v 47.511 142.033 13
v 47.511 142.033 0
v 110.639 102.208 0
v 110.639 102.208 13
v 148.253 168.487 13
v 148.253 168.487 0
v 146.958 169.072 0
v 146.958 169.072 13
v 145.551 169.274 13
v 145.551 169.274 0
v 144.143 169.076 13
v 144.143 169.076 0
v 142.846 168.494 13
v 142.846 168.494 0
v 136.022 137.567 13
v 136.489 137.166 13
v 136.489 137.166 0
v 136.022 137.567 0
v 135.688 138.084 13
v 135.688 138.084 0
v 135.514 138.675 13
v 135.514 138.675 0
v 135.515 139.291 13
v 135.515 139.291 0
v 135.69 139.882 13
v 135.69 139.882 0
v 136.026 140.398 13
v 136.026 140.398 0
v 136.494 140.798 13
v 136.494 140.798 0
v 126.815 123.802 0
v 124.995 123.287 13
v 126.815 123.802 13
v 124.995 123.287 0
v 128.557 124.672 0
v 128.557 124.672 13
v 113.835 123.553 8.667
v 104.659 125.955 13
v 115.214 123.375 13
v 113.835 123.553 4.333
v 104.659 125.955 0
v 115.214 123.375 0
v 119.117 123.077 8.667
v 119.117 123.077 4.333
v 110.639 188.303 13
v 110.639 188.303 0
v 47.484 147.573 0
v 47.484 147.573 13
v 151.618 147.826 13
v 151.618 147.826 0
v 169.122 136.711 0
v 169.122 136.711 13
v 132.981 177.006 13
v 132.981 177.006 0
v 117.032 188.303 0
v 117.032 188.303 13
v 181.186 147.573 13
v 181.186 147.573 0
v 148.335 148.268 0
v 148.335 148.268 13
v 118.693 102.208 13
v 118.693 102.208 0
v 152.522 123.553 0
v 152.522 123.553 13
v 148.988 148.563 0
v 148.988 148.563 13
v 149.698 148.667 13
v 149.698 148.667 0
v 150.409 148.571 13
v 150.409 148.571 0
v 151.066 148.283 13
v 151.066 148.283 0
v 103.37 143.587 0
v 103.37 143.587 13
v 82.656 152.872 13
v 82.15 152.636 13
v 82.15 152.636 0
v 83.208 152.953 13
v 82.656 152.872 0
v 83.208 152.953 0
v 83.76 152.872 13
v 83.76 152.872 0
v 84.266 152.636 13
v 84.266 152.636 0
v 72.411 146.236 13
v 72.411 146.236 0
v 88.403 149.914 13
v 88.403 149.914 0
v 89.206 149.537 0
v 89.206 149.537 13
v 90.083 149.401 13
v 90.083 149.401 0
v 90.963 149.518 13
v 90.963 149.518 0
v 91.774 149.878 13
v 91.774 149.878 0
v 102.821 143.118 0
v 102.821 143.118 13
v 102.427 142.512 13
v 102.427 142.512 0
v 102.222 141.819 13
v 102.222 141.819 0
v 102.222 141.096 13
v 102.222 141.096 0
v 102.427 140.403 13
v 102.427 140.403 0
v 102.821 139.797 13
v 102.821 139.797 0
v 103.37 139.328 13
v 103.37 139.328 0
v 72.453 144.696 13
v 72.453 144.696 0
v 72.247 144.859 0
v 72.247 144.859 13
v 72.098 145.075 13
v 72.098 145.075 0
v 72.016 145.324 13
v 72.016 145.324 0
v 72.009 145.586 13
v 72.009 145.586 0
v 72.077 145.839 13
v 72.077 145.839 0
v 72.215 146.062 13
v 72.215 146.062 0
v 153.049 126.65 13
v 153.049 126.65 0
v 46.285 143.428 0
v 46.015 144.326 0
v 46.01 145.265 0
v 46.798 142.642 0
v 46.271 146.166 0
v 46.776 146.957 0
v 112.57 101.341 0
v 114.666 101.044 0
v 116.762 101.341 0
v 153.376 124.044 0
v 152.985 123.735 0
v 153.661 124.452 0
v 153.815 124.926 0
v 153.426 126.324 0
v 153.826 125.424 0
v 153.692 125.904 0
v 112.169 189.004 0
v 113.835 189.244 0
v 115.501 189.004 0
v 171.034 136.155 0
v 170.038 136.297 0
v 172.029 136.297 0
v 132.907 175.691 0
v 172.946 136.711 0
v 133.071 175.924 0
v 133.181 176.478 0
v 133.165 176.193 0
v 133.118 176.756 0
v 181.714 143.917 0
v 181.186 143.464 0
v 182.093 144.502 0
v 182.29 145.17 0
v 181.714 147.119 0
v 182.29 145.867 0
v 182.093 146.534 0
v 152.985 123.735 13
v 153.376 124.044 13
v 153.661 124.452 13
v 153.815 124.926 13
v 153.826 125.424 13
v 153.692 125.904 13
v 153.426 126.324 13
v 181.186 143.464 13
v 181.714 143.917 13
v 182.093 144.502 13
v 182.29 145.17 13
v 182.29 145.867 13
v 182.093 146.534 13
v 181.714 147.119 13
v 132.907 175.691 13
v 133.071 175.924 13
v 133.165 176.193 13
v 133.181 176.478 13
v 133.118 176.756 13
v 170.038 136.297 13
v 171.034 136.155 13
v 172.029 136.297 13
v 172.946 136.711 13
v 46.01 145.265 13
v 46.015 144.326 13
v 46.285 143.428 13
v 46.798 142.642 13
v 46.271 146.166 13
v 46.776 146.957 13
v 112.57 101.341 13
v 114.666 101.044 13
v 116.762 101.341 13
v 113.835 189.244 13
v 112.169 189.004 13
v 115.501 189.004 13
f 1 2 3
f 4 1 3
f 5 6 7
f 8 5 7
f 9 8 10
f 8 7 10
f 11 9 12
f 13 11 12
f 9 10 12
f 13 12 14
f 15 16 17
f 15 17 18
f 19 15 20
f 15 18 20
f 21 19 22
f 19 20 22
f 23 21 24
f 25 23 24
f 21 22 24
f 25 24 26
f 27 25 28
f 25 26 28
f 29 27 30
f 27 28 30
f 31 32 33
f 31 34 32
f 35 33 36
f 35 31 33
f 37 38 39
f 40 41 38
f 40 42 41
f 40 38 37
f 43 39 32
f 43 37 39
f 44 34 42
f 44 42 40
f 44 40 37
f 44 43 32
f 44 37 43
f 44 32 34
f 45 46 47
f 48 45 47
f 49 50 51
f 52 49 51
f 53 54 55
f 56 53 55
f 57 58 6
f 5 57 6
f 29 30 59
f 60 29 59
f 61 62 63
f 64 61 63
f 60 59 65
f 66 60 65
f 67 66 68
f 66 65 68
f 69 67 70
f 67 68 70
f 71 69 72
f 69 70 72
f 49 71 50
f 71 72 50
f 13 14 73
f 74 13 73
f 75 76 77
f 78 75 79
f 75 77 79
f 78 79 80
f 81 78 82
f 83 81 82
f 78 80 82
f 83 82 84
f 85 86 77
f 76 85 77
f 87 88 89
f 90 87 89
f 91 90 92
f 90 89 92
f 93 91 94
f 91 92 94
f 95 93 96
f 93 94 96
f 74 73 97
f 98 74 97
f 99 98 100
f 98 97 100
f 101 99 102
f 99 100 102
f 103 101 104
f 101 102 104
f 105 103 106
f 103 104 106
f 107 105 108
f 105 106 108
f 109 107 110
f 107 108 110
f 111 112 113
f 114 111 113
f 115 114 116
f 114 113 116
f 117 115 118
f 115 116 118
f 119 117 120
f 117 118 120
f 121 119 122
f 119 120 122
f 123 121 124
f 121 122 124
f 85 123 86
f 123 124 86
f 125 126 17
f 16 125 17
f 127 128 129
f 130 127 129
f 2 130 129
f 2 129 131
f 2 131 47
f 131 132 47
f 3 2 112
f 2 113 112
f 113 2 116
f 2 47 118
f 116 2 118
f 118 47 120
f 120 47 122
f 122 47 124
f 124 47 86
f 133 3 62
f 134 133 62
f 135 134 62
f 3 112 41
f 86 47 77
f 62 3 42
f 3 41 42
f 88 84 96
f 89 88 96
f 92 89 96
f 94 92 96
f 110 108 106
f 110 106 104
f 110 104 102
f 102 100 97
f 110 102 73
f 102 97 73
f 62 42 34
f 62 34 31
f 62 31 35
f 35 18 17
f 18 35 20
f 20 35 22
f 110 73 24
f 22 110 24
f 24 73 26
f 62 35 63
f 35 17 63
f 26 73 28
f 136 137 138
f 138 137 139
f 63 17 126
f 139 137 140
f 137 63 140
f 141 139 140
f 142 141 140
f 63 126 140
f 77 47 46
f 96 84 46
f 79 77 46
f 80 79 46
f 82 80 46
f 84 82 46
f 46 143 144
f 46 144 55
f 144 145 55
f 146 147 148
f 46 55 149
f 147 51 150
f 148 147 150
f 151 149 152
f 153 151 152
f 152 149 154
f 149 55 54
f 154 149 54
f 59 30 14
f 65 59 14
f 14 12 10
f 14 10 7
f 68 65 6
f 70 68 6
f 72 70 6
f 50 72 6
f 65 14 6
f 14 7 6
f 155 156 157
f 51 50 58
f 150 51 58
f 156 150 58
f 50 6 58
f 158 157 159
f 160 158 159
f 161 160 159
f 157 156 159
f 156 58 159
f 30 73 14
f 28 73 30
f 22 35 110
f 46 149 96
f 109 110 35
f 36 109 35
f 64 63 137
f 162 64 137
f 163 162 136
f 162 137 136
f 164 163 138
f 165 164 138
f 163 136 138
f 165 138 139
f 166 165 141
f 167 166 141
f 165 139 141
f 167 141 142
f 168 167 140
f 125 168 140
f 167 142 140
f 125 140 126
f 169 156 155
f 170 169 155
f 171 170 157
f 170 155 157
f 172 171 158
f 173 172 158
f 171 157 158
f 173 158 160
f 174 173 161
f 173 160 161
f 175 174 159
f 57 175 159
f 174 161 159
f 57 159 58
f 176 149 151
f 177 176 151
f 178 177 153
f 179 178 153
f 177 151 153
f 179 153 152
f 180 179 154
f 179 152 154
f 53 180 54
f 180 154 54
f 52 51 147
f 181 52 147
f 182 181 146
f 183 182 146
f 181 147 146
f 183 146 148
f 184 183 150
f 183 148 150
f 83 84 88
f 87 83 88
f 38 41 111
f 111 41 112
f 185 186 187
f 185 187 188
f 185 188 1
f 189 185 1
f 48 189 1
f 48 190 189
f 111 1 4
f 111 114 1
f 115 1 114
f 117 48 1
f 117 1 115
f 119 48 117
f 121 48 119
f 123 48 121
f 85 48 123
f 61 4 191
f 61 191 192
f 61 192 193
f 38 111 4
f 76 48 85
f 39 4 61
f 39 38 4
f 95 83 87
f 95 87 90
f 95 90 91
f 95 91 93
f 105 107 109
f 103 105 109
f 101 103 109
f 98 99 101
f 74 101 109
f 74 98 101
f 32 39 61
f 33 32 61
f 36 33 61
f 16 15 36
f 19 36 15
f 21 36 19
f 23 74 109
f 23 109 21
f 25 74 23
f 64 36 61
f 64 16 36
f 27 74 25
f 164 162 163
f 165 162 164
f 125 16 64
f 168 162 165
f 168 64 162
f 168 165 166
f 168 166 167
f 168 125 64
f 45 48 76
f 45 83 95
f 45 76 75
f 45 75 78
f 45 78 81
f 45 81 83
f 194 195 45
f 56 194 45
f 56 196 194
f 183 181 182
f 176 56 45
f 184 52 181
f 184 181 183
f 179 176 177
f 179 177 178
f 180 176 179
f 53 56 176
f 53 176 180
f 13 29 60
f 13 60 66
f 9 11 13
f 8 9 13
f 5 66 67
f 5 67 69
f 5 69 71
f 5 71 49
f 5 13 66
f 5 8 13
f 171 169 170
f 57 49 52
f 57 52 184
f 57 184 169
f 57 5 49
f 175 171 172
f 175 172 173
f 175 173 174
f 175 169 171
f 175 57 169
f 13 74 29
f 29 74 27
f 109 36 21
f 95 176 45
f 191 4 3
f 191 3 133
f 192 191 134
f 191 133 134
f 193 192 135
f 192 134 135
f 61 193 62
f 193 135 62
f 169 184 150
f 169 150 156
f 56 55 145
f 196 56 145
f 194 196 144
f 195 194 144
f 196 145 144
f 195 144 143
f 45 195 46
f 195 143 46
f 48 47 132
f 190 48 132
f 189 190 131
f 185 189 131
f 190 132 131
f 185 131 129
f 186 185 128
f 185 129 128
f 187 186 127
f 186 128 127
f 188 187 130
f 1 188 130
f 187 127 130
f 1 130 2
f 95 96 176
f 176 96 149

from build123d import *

# Parameters (mm, degrees)
EXTRUDE_1_DEPTH = 13


with BuildPart() as part:
    # 草图1 → 凸台-拉伸1 (new body)
    with BuildSketch(Plane.XY):
        with BuildLine():
            Line((47.511484966, 142.033134461), (110.638937631, 102.207761638))
            ThreePointArc((110.638937631, 102.207761638), (114.665827011, 101.043744068), (118.692649861, 102.207991771))
            Line((118.692649861, 102.207991771), (152.521772353, 123.552557153))
            ThreePointArc((152.521772353, 123.552557153), (153.81505185, 124.925900716), (153.04891629, 126.649757061))
            Line((153.04891629, 126.649757061), (136.489129492, 137.165850219))
            ThreePointArc((136.489129492, 137.165850219), (135.492047357, 138.983315731), (136.494426509, 140.797865181))
            Line((136.494426509, 140.797865181), (148.334619381, 148.268463065))
            ThreePointArc((148.334619381, 148.268463065), (150.056794855, 148.643643111), (151.618362398, 147.826235477))
            Line((151.618362398, 147.826235477), (169.12186053, 136.710849803))
            ThreePointArc((169.12186053, 136.710849803), (171.033857417, 136.155053995), (172.945854303, 136.710849803))
            Line((172.945854303, 136.710849803), (181.18602163, 143.463793951))
            ThreePointArc((181.18602163, 143.463793951), (182.315098555, 145.518303295), (181.18602163, 147.572812638))
            Line((181.18602163, 147.572812638), (148.25303307, 168.486510374))
            ThreePointArc((148.25303307, 168.486510374), (145.550526458, 169.274236069), (142.84573367, 168.494396508))
            Line((142.84573367, 168.494396508), (103.370364428, 143.587318295))
            ThreePointArc((103.370364428, 143.587318295), (102.195954559, 141.45767708), (103.370375956, 139.328042221))
            Line((103.370375956, 139.328042221), (128.55687664, 124.67236247))
            add(Edge.make_bspline(
                [(104.659407223, 125.955435879), (107.630554524, 124.900634476), (112.429978189, 123.518860294), (120.55796174, 122.941026513), (125.679246688, 122.847455284), (128.55687664, 124.67236247)],
                knots=[0, 0, 0, 0, 0.387587107, 0.604017493, 1, 1, 1, 1], degree=3))
            Line((104.659407223, 125.955435879), (72.452510917, 144.69618768))
            ThreePointArc((72.452510917, 144.69618768), (72.002596111, 145.454480563), (72.410625454, 146.236109301))
            Line((72.410625454, 146.236109301), (82.149898801, 152.636203216))
            ThreePointArc((82.149898801, 152.636203216), (83.207924224, 152.95258239), (84.265790914, 152.635672874))
            Line((84.265790914, 152.635672874), (88.402902158, 149.914029293))
            ThreePointArc((88.402902158, 149.914029293), (90.083226665, 149.40103976), (91.774170174, 149.877861281))
            Line((91.774170174, 149.877861281), (132.907259914, 175.690631112))
            ThreePointArc((132.907259914, 175.690631112), (133.18297095, 176.334767089), (132.980807122, 177.005630354))
            Line((132.980807122, 177.005630354), (117.031500859, 188.303055623))
            ThreePointArc((117.031500859, 188.303055623), (113.835262941, 189.244329835), (110.639025024, 188.303055623))
            Line((110.639025024, 188.303055623), (47.48382646, 147.572951165))
            ThreePointArc((47.48382646, 147.572951165), (45.979061901, 144.795460967), (47.511484966, 142.033134461))
        make_face()
    extrude(amount=EXTRUDE_1_DEPTH)


solid = part.part
